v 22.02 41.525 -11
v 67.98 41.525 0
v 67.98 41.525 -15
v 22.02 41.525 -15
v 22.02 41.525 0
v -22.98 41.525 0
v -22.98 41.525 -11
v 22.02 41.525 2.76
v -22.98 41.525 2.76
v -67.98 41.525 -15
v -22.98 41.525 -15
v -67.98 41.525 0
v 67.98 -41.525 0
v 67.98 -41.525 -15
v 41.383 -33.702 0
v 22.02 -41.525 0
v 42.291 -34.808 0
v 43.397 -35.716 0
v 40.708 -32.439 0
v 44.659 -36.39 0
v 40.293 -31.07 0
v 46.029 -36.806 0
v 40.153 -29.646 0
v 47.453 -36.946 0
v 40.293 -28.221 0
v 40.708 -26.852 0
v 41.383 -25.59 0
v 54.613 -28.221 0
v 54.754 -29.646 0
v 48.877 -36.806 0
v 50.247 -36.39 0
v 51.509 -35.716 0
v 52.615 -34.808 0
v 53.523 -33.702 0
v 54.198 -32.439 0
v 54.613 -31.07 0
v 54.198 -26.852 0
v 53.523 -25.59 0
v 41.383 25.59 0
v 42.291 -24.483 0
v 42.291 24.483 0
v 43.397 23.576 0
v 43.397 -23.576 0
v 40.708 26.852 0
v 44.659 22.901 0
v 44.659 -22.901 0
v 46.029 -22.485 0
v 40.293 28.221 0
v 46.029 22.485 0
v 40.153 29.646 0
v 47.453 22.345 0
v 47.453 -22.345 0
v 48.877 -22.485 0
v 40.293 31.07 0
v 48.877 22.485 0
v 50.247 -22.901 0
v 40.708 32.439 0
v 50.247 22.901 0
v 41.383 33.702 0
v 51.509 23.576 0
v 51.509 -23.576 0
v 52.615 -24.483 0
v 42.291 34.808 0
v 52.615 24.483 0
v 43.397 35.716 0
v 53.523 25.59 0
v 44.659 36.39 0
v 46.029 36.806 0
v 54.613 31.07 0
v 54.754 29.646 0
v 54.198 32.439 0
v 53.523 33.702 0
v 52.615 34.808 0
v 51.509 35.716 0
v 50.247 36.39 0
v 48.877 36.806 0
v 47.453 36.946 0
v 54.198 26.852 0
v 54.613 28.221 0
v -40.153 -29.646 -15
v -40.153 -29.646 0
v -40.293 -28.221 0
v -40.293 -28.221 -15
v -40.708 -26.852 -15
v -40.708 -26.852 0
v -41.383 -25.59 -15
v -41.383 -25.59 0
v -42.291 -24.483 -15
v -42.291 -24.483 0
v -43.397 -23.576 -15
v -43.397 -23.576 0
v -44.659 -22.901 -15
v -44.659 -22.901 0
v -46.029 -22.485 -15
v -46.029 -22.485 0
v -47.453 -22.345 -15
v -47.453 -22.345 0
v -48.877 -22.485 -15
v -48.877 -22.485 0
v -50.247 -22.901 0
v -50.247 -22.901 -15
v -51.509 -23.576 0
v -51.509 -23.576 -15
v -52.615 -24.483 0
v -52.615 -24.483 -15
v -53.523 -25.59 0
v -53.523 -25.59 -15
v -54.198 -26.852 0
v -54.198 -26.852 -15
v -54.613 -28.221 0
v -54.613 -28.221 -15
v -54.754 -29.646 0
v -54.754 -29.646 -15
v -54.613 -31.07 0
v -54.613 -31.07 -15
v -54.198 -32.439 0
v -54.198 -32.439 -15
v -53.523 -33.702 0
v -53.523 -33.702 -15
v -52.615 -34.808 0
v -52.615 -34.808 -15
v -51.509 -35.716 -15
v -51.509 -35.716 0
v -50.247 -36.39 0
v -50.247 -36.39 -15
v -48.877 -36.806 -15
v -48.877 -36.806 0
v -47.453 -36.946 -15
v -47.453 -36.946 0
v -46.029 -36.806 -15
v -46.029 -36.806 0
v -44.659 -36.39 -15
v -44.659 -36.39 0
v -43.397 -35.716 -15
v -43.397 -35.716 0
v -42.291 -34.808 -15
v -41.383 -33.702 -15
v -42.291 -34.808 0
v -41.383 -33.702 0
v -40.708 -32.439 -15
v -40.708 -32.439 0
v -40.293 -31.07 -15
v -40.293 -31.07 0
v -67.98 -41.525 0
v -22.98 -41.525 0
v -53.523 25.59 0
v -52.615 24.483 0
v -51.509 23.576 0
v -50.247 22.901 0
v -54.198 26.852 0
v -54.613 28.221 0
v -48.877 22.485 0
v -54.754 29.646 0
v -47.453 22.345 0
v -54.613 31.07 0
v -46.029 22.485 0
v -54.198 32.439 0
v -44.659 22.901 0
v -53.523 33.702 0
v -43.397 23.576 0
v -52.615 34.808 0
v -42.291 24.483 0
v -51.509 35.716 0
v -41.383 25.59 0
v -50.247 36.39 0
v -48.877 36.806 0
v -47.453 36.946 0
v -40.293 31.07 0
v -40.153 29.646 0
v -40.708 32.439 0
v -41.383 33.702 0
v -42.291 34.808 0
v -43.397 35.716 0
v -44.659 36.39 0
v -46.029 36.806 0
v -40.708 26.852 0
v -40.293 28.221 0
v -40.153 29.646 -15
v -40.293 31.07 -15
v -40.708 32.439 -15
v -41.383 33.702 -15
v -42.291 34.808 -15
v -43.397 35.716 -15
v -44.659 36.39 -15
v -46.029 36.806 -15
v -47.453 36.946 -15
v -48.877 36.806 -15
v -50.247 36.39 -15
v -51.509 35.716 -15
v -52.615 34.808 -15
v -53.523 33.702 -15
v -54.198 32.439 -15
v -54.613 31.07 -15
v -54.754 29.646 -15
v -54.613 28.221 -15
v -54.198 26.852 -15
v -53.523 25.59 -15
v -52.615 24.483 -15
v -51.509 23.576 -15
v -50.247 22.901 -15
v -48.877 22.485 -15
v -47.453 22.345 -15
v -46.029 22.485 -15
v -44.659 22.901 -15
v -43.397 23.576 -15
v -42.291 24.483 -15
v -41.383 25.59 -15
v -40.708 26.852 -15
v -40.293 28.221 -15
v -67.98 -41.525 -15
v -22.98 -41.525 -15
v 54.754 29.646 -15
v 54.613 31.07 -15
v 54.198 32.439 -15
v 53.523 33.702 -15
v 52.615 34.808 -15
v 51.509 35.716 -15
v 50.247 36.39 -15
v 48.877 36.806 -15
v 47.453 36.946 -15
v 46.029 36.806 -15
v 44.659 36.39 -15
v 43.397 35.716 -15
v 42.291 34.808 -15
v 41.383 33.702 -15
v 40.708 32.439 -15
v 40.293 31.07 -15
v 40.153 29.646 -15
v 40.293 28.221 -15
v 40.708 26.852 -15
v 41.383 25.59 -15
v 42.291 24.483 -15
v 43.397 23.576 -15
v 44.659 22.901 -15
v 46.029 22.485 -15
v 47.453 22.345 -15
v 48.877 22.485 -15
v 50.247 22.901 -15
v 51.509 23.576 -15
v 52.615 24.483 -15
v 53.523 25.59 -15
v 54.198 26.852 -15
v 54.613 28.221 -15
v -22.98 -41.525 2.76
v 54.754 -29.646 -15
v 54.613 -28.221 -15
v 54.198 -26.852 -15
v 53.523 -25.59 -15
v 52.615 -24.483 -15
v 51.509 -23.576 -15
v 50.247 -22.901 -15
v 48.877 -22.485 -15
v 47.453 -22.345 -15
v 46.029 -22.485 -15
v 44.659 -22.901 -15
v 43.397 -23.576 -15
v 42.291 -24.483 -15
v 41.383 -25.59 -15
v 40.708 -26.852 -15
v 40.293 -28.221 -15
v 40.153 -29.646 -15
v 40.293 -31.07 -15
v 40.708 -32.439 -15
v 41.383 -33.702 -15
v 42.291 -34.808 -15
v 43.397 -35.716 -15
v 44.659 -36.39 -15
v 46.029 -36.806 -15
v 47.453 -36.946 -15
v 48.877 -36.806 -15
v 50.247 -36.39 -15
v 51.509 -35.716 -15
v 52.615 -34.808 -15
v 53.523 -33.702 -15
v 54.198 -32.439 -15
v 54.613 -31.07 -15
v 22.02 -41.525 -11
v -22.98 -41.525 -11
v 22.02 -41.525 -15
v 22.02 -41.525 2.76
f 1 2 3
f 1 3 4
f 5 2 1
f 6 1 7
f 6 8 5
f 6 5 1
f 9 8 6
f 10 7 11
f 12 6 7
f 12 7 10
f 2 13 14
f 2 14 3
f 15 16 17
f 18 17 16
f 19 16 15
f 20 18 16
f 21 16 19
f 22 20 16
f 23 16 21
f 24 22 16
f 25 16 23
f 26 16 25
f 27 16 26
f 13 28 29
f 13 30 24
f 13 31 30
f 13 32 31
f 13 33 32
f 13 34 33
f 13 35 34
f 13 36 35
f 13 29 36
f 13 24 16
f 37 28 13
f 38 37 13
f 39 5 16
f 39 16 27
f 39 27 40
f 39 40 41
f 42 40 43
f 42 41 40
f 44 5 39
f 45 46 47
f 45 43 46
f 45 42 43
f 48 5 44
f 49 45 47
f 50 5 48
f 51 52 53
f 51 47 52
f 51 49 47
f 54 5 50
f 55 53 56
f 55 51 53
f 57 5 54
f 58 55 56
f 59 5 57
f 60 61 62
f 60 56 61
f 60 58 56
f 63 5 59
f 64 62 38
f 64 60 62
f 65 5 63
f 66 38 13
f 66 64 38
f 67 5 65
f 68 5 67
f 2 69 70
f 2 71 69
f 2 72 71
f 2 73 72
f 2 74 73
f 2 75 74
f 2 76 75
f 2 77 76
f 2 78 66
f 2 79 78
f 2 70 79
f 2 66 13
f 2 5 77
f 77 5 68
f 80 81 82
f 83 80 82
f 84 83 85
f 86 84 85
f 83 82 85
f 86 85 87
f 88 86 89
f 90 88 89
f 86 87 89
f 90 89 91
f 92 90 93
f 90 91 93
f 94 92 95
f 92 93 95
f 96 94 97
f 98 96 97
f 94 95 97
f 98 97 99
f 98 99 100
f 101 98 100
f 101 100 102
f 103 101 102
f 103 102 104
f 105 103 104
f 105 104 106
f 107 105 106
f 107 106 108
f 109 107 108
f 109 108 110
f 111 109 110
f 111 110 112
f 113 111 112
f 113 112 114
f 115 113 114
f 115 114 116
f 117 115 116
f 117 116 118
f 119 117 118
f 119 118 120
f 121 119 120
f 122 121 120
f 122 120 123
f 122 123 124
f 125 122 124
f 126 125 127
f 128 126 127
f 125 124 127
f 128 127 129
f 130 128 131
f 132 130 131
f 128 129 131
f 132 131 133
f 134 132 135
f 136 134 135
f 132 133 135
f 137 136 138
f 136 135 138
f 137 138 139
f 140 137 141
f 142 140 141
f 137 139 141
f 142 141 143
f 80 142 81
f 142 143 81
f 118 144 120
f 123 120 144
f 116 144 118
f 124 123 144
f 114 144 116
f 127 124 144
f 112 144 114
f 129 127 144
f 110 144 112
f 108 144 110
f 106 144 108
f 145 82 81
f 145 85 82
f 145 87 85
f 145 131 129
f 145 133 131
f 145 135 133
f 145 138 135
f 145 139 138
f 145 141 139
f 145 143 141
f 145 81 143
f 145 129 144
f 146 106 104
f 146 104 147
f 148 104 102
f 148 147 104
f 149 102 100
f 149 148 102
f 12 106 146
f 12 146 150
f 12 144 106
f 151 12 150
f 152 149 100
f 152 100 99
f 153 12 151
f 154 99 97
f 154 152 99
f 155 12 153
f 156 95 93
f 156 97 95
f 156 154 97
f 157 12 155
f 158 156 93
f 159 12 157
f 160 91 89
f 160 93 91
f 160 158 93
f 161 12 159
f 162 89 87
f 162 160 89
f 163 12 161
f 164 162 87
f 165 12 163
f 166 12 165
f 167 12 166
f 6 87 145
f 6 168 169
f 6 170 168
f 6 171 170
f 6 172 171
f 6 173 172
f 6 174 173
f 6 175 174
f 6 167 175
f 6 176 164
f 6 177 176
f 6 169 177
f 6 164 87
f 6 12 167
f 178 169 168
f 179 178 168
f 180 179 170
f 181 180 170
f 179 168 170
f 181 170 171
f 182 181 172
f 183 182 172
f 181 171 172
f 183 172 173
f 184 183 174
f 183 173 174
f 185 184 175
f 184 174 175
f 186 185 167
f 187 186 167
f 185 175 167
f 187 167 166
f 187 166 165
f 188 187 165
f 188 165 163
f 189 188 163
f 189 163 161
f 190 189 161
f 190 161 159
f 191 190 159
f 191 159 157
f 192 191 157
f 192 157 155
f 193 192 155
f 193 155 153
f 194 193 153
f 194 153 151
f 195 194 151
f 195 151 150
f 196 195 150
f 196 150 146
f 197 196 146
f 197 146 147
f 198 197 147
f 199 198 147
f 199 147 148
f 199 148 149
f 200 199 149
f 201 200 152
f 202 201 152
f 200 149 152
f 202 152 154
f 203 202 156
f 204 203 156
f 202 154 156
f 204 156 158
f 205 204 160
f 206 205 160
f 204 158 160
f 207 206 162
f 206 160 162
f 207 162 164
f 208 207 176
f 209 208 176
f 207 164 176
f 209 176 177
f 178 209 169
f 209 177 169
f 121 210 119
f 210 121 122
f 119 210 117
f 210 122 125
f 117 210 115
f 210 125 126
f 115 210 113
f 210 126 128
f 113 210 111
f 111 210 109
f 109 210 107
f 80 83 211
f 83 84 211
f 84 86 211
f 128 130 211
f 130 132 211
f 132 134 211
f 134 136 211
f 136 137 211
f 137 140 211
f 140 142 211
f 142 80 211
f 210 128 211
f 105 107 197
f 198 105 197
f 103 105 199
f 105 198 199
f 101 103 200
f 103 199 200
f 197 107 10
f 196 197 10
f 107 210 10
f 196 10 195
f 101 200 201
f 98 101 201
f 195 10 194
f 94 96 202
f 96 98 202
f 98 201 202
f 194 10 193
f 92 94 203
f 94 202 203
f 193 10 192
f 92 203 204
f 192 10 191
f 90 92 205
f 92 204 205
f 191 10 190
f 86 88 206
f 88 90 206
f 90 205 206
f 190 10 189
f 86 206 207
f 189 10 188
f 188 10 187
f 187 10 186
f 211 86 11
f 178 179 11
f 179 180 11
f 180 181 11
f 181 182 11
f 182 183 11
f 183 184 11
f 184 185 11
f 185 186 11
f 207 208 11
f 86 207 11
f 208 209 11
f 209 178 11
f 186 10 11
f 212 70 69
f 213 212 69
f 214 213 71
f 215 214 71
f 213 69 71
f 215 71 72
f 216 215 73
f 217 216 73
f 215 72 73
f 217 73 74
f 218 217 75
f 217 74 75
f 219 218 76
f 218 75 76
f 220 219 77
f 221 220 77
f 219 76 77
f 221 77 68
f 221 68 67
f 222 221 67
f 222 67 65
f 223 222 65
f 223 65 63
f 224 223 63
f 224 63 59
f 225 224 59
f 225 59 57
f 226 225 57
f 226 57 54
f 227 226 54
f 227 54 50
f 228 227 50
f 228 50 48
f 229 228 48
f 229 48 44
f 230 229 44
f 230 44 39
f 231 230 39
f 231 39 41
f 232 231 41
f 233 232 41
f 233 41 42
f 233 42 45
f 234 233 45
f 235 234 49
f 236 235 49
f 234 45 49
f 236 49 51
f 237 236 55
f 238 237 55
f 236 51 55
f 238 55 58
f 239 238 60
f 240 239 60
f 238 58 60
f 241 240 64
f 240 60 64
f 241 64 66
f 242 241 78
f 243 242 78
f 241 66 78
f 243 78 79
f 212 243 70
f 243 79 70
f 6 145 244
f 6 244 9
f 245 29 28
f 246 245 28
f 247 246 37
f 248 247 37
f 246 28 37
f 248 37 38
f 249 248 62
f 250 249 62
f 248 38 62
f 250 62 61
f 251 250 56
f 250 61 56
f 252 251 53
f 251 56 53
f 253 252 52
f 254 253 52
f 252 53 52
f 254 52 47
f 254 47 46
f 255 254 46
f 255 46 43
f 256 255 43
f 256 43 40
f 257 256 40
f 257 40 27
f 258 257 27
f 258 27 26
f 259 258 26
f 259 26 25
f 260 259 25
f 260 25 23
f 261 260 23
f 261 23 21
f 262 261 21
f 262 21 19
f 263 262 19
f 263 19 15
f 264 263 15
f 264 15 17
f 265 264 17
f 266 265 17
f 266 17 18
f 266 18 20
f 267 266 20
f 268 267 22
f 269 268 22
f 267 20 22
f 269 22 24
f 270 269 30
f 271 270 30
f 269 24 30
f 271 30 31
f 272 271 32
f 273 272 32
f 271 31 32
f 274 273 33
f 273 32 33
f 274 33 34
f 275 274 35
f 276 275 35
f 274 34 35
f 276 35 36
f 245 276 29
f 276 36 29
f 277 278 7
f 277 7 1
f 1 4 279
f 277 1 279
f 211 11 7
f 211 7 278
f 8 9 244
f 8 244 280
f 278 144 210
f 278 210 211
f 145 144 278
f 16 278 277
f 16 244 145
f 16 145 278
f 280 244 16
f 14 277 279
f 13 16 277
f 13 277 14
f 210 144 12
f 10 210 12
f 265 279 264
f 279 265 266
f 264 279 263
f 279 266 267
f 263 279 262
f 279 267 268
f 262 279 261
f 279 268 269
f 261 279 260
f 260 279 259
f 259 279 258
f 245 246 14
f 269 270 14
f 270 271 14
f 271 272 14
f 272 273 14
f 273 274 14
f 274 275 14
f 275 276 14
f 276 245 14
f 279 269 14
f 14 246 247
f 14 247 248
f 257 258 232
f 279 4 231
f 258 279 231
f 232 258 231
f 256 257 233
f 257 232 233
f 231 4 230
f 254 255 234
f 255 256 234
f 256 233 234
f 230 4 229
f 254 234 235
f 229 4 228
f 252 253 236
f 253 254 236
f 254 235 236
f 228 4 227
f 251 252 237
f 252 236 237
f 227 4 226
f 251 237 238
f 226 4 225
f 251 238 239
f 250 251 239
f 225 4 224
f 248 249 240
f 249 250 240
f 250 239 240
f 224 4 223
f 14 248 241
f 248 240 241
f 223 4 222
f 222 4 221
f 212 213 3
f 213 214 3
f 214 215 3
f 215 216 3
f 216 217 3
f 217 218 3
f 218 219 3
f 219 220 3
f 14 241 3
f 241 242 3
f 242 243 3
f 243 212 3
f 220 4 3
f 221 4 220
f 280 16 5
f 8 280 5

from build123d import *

# Parameters (mm, degrees)
F0_W     = 45
F0_H     = 83.05
F0_W_2   = 45.96
F1_DEPTH = 15
F2_DEPTH = 2.76
F3_W     = 45
F3_H     = 83.05
F4_DEPTH = 4
F5_R     = 7.300499
F6_DEPTH = 15.001


with BuildPart() as f1:
    # F0 (on Top) → F1 (new body)
    with BuildSketch(Plane.XY):
        with Locations((-45.48, 0)):
            Rectangle(F0_W, F0_H)
        with Locations((-0.48, 0)):
            Rectangle(F0_W, F0_H)
        with Locations((45, 0)):
            Rectangle(F0_W_2, F0_H)
    extrude(amount=-F1_DEPTH)

    # F0 (on Top) → F2 (join)
    with BuildSketch(Plane.XY):
        with Locations((-0.48, 0)):
            Rectangle(F0_W, F0_H)
    extrude(amount=F2_DEPTH)

    # F3 (on face) → F4 (cut)
    with BuildSketch(Plane(origin=(0, 0, -15), x_dir=(1, 0, 0), z_dir=(0, 0, -1))):
        with Locations((-0.48, 0)):
            Rectangle(F3_W, F3_H)
    extrude(amount=-F4_DEPTH, mode=Mode.SUBTRACT)

    # F5 (on face) → F6 (cut, through all)
    with BuildSketch(Plane.XY):
        with Locations((-47.45315, 29.645713)):
            Circle(F5_R)
        with Locations((-47.45315, -29.645713)):
            Circle(F5_R)
        with Locations((47.45315, 29.645713)):
            Circle(F5_R)
        with Locations((47.45315, -29.645713)):
            Circle(F5_R)
    extrude(amount=-F6_DEPTH, mode=Mode.SUBTRACT)


solid = f1.part
